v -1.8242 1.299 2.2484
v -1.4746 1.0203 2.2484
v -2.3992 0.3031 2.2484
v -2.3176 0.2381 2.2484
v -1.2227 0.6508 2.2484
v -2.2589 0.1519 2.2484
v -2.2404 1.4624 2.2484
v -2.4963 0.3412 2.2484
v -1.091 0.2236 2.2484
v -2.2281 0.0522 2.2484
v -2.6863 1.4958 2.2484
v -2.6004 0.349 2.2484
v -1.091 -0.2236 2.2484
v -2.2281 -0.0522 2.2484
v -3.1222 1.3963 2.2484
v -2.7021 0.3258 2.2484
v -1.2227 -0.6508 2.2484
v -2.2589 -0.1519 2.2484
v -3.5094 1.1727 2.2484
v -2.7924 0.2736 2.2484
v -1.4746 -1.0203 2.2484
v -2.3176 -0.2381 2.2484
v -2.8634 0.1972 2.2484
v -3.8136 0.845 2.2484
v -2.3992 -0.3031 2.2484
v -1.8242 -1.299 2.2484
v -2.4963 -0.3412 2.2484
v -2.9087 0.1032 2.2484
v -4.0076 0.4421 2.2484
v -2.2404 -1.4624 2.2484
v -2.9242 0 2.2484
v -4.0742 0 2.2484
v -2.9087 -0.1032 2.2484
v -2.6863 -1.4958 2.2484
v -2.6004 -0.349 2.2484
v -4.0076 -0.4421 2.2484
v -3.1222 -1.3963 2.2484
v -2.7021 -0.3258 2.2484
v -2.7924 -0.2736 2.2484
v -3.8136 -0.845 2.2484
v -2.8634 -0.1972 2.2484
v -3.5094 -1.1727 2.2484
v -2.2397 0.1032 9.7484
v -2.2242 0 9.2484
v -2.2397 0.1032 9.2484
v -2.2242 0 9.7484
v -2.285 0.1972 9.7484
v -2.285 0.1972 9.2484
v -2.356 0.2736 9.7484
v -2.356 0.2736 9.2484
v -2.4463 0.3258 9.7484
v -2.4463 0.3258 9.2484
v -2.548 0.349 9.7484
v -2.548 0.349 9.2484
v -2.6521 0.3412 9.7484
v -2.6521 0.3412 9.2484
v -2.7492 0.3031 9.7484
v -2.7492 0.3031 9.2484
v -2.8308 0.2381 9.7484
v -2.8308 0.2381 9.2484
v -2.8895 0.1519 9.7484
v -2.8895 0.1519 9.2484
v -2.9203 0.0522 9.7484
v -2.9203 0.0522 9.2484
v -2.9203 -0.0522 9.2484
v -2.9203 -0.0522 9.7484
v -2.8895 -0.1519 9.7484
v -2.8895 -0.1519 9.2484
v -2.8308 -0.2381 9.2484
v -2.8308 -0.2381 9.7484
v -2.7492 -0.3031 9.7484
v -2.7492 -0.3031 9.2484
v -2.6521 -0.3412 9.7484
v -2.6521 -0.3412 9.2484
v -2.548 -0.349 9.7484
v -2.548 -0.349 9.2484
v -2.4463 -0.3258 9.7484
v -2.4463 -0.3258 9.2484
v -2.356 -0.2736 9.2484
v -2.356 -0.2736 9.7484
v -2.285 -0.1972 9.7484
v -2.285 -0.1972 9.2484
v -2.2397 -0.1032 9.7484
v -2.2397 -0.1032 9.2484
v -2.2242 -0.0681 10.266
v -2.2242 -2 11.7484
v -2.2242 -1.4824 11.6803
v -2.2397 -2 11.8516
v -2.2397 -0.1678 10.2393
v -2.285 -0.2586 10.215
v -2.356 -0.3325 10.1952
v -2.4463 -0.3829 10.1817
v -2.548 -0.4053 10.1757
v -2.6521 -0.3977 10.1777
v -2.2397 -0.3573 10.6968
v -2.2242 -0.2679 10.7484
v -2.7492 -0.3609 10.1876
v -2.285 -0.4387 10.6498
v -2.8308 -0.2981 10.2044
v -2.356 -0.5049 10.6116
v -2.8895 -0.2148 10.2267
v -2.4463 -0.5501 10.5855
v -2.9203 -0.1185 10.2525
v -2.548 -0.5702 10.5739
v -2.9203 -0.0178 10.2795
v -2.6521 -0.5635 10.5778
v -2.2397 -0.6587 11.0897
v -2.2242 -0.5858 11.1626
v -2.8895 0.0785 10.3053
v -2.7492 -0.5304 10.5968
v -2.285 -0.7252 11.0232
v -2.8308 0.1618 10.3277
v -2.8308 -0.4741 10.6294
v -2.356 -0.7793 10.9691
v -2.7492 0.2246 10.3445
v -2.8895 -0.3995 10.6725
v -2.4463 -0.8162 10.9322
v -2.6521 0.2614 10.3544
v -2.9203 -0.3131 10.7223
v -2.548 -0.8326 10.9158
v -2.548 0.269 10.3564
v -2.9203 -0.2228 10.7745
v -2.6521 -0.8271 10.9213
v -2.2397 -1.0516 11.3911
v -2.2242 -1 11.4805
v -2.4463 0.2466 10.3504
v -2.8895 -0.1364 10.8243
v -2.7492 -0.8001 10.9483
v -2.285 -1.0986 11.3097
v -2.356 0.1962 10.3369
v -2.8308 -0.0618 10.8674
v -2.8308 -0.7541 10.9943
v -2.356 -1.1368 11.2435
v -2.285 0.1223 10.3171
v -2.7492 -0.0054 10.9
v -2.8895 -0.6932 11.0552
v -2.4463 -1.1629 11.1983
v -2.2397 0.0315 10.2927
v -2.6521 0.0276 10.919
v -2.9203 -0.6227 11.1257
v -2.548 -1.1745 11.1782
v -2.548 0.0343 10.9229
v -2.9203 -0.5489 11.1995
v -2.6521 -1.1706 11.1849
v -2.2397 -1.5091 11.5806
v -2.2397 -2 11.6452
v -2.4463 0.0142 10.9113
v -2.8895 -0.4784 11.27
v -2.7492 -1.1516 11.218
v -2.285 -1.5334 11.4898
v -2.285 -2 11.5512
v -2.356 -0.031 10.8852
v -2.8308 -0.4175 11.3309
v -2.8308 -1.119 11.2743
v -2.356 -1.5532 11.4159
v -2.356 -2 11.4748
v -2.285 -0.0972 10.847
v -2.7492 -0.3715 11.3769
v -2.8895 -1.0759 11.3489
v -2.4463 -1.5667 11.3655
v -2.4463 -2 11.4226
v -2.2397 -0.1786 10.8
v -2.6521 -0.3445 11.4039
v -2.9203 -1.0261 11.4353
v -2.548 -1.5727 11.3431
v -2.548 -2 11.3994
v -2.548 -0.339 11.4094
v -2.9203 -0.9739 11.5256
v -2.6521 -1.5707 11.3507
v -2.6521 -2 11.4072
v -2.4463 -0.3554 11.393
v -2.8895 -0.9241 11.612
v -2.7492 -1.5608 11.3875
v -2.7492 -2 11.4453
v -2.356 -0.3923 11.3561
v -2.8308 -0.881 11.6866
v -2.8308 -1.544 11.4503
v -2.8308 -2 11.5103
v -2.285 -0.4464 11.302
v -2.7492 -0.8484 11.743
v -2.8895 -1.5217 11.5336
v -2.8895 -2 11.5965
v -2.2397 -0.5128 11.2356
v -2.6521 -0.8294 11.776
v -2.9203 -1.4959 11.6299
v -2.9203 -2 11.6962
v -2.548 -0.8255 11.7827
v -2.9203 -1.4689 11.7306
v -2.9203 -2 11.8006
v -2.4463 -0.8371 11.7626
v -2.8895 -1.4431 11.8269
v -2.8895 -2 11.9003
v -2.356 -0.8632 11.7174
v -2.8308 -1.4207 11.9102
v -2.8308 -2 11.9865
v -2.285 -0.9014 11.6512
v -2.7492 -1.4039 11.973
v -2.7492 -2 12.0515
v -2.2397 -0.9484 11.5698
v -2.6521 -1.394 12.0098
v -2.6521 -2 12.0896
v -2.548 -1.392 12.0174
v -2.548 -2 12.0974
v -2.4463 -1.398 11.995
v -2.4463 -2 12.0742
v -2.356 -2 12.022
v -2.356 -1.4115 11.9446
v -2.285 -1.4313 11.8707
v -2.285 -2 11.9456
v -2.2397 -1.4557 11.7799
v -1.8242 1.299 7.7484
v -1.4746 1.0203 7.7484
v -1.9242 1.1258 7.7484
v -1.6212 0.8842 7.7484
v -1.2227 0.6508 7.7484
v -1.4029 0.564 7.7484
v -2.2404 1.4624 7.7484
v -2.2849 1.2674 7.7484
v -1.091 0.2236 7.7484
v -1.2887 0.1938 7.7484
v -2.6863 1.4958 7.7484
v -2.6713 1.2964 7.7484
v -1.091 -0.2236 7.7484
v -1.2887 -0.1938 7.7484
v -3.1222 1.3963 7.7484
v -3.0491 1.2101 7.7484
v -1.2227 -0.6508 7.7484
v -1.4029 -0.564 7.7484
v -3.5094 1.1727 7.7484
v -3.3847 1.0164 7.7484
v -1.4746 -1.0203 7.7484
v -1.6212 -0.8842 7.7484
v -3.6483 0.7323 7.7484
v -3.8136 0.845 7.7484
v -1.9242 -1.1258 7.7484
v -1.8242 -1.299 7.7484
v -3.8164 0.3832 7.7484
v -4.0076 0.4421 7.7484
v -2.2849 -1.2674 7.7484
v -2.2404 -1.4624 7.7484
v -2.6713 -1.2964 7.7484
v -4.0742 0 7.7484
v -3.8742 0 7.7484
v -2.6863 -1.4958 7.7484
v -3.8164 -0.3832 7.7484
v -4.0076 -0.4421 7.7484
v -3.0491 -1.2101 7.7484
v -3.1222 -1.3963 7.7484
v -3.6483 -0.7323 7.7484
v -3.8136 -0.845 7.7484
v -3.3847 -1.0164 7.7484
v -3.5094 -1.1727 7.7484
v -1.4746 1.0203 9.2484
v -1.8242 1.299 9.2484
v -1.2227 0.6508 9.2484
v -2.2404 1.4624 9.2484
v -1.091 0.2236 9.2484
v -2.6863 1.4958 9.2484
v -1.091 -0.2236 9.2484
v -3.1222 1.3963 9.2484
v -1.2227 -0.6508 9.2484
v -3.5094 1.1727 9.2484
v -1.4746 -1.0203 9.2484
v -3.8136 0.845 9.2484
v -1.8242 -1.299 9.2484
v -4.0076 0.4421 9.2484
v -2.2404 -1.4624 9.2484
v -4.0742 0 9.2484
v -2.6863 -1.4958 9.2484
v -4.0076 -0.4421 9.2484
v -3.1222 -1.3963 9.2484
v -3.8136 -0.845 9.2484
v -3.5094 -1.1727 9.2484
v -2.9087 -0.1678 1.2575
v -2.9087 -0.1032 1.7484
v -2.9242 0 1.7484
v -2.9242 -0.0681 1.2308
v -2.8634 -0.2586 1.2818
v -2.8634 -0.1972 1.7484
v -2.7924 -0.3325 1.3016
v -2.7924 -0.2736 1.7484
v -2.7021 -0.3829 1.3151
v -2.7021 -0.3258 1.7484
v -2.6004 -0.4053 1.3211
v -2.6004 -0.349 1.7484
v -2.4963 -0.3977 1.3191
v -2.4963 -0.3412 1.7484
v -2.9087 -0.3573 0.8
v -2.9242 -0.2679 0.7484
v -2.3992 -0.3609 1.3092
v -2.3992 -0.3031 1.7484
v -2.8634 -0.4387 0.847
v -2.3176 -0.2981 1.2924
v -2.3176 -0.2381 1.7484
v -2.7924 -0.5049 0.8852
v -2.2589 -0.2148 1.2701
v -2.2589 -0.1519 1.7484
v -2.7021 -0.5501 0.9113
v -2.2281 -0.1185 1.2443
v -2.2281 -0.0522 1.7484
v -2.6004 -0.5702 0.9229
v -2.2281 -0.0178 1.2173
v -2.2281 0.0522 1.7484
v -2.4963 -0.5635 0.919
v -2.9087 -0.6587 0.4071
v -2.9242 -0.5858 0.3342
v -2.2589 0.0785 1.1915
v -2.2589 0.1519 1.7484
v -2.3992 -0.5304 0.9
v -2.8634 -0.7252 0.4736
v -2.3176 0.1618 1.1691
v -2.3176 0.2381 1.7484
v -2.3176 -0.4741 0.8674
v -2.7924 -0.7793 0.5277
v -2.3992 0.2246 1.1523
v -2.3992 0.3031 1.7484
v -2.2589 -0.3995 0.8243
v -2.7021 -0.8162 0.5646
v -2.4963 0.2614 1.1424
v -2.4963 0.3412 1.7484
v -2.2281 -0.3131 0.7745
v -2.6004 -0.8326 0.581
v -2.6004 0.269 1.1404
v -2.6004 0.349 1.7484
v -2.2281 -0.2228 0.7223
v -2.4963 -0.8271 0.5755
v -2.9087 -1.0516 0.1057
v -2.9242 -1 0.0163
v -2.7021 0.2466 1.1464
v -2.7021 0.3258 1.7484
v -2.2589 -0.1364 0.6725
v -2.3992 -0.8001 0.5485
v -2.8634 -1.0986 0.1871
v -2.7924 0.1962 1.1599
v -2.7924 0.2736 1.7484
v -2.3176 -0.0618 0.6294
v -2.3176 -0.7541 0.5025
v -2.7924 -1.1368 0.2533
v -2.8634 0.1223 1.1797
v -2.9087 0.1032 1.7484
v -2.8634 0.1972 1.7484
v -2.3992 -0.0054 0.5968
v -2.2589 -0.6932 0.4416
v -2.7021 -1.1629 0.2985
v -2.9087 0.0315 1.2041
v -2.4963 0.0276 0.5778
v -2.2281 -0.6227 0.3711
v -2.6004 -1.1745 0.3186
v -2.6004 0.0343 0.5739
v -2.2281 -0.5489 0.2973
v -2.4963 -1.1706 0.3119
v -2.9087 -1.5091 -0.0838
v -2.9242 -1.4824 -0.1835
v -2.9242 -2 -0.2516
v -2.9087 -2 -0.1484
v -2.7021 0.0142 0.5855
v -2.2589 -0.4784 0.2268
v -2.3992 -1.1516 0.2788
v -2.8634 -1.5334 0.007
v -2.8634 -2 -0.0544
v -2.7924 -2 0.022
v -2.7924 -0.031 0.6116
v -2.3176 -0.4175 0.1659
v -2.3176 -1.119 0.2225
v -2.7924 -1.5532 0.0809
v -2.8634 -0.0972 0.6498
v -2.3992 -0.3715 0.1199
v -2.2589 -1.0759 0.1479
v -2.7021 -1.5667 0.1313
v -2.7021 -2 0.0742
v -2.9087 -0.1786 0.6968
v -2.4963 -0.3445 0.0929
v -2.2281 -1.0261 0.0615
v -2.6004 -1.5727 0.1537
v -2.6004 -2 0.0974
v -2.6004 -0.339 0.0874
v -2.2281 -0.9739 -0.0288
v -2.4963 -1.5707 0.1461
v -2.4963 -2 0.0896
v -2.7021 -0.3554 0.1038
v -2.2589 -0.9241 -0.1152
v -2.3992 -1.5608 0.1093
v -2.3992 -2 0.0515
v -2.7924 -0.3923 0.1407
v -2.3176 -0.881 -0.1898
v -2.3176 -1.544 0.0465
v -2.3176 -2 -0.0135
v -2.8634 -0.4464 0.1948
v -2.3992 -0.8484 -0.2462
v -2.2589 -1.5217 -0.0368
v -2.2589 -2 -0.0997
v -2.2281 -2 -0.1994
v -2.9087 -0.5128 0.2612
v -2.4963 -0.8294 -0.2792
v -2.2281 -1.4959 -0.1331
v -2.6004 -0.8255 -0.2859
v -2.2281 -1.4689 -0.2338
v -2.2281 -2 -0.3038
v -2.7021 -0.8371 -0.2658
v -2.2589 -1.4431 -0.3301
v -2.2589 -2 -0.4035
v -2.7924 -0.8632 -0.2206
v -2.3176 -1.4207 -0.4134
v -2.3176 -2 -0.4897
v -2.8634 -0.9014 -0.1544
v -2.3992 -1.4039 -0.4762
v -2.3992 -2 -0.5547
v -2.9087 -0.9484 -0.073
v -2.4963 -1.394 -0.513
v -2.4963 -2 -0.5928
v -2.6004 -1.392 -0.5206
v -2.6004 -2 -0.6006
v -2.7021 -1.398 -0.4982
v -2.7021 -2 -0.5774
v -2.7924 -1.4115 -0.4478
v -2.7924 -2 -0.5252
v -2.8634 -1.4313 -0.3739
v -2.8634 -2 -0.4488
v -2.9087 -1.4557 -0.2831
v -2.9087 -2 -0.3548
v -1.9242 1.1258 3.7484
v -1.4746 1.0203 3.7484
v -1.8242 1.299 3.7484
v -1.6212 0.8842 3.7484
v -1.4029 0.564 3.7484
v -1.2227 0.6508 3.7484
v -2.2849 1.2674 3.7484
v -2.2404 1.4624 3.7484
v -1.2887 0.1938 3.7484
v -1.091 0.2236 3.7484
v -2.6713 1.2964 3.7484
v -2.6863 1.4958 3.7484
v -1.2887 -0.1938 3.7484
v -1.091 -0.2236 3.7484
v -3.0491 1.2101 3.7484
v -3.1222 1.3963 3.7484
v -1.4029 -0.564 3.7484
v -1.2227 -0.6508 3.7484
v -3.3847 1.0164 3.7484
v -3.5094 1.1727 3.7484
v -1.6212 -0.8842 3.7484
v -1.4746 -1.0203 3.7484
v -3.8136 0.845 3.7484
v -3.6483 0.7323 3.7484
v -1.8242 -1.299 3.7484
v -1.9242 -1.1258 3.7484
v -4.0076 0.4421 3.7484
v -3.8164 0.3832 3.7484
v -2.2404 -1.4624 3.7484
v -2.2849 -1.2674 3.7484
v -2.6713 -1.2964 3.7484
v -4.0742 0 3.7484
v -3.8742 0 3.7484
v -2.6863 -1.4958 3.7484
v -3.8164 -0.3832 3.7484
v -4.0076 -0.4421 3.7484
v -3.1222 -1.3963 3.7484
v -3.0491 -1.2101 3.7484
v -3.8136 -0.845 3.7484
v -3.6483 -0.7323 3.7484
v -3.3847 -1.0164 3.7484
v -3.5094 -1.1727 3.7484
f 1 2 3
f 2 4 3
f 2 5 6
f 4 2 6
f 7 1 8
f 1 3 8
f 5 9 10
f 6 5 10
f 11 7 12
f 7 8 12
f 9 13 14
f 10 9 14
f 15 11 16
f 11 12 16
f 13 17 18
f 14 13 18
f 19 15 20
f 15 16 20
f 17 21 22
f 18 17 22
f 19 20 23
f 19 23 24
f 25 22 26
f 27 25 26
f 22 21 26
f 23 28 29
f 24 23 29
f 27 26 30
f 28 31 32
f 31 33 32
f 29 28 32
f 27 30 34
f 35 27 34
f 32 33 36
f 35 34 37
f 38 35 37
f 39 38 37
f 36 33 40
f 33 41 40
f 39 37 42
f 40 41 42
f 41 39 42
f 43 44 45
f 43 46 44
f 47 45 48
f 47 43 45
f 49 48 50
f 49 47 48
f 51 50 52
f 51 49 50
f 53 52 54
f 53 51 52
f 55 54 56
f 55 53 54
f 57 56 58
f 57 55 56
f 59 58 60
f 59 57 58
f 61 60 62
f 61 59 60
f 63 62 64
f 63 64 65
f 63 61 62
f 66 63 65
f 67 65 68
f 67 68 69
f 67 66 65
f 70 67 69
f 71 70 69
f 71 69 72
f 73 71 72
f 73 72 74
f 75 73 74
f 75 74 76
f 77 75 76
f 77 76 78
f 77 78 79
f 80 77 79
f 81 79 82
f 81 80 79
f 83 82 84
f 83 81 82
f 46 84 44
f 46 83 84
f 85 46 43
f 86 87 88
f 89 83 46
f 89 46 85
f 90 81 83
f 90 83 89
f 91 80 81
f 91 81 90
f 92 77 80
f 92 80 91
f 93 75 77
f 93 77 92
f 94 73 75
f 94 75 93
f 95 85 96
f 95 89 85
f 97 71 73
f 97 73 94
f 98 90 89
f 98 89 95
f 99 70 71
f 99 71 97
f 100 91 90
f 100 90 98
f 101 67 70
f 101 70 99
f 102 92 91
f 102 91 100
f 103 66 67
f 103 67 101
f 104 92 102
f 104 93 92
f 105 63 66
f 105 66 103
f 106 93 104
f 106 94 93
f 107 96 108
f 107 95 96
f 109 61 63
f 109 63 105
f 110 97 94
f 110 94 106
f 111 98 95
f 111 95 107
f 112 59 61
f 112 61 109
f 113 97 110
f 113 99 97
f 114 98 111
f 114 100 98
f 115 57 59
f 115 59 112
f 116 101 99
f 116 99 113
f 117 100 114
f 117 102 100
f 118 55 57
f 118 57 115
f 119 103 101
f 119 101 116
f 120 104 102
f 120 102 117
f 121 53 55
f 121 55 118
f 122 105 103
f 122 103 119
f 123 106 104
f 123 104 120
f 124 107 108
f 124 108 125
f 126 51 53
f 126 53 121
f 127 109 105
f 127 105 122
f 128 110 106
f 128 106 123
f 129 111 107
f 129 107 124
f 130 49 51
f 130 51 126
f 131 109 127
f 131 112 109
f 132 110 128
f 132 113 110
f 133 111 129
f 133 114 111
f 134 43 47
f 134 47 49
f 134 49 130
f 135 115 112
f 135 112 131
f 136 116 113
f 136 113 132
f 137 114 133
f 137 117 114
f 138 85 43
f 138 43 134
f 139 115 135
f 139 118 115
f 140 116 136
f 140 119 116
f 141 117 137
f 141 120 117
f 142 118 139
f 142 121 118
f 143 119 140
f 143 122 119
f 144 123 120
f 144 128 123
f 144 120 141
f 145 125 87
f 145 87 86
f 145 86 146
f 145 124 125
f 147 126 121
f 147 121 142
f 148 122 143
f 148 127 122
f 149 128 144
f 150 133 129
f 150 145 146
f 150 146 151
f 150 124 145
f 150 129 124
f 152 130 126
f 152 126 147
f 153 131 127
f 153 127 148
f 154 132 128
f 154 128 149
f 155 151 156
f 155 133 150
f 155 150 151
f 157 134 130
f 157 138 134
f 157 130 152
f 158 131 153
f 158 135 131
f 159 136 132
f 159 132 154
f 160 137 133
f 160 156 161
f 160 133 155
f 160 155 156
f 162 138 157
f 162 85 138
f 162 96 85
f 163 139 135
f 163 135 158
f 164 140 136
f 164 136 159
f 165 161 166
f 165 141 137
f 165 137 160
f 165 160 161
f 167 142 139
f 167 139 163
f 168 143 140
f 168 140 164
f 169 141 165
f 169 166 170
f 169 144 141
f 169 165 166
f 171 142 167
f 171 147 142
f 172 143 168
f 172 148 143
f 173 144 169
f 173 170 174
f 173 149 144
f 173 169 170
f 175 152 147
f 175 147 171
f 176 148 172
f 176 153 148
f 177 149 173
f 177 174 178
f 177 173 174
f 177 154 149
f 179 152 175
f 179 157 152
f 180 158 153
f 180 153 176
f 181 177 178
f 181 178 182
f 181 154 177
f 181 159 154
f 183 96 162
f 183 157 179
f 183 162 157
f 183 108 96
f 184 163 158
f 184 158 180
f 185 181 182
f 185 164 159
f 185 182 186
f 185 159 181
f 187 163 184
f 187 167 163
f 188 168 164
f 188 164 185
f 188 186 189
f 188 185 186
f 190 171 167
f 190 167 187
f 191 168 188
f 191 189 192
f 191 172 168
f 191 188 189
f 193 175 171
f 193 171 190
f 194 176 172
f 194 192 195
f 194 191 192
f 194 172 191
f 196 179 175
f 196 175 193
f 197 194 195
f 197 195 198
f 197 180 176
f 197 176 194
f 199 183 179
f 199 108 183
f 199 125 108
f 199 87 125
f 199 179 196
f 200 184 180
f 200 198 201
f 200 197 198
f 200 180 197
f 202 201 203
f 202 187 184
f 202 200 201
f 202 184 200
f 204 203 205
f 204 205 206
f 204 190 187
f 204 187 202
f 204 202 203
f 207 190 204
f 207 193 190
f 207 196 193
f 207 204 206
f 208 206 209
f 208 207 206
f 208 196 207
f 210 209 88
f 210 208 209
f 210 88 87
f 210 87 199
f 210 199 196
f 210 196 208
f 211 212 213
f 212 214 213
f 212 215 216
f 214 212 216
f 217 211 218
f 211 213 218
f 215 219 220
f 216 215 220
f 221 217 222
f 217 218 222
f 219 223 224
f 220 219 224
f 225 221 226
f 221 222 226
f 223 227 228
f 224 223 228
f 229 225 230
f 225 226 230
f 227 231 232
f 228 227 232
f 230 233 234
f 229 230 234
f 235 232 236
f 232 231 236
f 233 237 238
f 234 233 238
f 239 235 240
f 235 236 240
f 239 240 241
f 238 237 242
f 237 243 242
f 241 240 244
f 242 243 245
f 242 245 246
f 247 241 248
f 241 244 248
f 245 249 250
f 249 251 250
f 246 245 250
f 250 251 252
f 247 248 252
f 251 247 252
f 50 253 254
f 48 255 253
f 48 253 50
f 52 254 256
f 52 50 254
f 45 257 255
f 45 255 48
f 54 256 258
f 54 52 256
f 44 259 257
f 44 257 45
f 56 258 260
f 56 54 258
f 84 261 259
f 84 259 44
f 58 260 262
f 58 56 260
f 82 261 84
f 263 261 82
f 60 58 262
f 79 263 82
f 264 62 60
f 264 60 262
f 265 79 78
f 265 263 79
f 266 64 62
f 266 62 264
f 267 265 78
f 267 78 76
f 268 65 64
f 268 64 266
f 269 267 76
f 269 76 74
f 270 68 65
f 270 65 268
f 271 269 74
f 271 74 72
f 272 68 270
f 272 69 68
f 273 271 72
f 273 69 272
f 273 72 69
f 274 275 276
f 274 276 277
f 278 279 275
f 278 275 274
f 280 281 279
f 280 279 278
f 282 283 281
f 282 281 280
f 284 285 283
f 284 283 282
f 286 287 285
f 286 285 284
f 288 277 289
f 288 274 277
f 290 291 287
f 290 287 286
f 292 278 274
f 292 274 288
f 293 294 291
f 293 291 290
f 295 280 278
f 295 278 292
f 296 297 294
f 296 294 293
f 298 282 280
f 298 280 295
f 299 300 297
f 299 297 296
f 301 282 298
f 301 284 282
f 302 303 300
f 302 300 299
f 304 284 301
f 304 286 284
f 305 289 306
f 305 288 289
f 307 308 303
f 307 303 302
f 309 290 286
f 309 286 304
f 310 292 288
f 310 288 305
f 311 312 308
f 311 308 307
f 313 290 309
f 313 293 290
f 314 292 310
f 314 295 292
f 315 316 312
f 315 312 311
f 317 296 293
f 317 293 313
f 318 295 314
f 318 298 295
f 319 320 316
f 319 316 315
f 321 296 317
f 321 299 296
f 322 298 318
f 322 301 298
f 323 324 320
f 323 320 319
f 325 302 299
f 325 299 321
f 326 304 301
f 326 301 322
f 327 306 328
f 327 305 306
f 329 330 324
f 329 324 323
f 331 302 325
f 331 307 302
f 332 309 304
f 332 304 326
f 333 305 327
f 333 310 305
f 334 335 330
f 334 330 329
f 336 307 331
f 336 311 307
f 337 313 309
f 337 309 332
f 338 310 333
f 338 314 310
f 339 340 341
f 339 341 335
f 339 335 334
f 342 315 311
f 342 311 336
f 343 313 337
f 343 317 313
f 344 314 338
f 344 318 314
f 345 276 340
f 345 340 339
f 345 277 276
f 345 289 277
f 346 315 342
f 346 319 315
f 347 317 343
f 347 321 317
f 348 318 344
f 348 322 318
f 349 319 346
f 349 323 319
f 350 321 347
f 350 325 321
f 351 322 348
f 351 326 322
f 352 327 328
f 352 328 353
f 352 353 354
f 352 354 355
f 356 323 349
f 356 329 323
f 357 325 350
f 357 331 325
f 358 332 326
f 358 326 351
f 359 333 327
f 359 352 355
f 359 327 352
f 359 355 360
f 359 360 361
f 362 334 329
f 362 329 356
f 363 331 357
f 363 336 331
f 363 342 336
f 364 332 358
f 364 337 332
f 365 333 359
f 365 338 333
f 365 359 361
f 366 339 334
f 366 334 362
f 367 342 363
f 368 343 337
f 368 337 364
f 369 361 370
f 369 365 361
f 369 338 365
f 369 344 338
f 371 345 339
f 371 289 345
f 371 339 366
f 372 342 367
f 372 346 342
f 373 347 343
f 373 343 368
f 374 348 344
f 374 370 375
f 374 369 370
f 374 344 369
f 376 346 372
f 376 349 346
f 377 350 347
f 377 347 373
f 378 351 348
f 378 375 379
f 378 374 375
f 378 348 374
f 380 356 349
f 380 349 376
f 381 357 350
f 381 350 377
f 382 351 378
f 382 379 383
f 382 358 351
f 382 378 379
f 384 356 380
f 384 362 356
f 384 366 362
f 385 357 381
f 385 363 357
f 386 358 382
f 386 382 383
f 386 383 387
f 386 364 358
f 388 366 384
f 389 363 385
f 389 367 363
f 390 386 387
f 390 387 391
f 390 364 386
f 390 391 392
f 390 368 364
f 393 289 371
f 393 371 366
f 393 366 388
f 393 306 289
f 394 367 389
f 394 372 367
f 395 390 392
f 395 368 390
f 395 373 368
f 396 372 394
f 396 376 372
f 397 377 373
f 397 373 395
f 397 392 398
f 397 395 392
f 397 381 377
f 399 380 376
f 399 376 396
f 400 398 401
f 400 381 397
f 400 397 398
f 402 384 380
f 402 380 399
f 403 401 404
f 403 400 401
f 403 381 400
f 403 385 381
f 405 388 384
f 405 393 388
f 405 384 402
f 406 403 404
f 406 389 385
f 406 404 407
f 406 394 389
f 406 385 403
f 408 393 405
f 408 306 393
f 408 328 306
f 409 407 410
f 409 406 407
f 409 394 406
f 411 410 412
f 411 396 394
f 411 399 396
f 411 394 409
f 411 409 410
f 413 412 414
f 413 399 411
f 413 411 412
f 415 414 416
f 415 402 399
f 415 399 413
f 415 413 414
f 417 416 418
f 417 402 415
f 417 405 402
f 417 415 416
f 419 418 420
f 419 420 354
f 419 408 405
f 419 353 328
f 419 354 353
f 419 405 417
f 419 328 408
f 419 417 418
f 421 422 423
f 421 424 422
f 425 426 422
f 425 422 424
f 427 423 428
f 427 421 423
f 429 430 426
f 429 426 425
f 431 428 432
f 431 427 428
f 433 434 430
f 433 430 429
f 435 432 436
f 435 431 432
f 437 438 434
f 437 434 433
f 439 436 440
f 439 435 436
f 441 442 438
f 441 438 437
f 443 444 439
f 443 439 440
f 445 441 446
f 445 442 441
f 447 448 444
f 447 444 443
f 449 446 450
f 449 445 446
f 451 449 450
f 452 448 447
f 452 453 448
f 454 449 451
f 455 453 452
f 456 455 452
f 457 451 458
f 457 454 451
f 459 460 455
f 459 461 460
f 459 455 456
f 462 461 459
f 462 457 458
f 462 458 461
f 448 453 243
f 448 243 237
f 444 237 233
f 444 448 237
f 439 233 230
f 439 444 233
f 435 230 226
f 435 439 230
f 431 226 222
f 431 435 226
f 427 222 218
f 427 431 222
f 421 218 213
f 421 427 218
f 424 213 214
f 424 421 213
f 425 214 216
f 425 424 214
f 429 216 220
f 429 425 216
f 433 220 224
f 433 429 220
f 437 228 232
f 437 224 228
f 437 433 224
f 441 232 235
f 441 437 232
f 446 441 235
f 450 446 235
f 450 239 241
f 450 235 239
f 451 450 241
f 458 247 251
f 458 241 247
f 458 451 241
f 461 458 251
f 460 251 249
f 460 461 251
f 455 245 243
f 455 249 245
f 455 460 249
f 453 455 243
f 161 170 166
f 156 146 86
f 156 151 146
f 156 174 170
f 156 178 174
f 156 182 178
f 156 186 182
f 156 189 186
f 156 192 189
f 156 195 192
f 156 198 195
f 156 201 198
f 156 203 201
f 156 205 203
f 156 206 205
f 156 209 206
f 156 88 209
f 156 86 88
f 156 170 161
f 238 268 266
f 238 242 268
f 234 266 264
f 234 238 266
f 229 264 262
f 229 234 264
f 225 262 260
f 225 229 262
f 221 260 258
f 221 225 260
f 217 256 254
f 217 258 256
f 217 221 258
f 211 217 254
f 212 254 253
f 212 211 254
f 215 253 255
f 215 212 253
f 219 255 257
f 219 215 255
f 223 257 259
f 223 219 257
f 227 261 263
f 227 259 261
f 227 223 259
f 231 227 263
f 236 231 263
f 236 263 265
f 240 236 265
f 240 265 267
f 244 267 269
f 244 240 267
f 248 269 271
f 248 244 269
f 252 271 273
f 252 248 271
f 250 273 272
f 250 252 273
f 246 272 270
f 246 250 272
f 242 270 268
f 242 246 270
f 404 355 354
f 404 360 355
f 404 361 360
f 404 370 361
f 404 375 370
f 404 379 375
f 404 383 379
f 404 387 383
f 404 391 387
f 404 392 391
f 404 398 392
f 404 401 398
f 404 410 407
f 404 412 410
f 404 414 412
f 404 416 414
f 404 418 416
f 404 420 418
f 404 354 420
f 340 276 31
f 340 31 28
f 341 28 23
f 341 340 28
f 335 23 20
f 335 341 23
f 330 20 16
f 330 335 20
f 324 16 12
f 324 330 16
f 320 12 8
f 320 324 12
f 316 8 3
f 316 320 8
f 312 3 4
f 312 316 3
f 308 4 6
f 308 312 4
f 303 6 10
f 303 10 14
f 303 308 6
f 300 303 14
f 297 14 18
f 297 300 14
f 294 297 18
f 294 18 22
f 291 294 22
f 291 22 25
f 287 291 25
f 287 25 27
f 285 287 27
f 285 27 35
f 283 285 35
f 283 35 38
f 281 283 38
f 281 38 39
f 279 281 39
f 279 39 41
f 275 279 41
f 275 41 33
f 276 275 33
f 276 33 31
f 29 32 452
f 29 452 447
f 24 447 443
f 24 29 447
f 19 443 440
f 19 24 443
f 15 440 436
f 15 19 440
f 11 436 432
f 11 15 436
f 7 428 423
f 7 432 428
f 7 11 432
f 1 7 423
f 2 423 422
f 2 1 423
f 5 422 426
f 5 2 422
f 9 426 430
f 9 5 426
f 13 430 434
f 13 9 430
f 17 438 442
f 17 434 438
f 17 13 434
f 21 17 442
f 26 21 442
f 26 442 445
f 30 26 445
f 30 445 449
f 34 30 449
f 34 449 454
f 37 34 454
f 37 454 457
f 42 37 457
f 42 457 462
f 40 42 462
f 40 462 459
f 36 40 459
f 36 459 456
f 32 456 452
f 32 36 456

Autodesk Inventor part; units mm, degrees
ref_plane "YZ Plane" through (0, 0, 0) normal (1, 0, 0) x (0, 1, 0)
ref_plane "XZ Plane" through (0, 0, 0) normal (0, 1, 0) x (-1, 0, 0)
ref_plane "XY Plane" through (0, 0, 0) normal (0, 0, 1) x (1, 0, 0)
sketch "Эскиз1" plane through (0, 0, 0) normal (0, 1, 0) x (-1, 0, 0)
  line L0 (4.0742, 9.2484) -> (4.0742, 7.7484)
  line L1 (4.0742, 7.7484) -> (3.8742, 7.7484)
  line L2 (3.8742, 7.7484) -> (3.8742, 3.7484)
  line L3 (3.8742, 3.7484) -> (4.0742, 3.7484)
  line L4 (4.0742, 3.7484) -> (4.0742, 2.2484)
  line L5 (4.0742, 2.2484) -> (2.5742, 2.2484)
  line L6 (2.5742, 2.2484) -> (2.5742, 9.2484)
  line L7 (2.5742, 9.2484) -> (4.0742, 9.2484)
  point P0 (0, 0)
  dimension "d0" = 1.5
  dimension "d1" = 0.2
  dimension "d2" = 4
  dimension "d3" = 0.2
  dimension "d4" = 1.5
  dimension "d5" = 1.5
  dimension "d6" = 7
revolve "Вращение1" add sketch "Эскиз1" angle 360 about axis through (-2.5742, 0, 2.2484) along (0, 0, 1)
sketch "Эскиз2" plane through (-2.5742, 0, 9.2484) normal (0, 0, 1) x (1, 0, 0)
  circle A0 centre (0, 0) radius 1.3 projected
  circle A1 centre (0, 0) radius 0.35
  circle A2 centre (-6.8053, 0) radius 0.3139
  point P0 (2.5742, 0)
  dimension "d8" = 0.7
sketch "Эскиз3" plane through (-2.5742, 0, 2.2484) normal (0, 0, -1) x (-1, 0, 0)
  circle A0 centre (0, 0) radius 0.35
  point P0 (-2.5742, 0)
  dimension "d9" = 0.7
sketch3d "3D эскиз1"
  line L0 (-2.5742, 0, 2.2484) -> (-2.5742, 0, 1.7484)
  arc A0 (-2.5742, 0, 1.7484) -> (-2.5742, -2, -0.2516) centre (-2.5742, -2, 1.7484) ccw
  dimension "d10" = 2.5
  dimension "d11" = 2
  dimension "d16" = 2
sweep "Сдвиг2" add profiles "Эскиз3" path "3D эскиз1"
sketch3d "3D эскиз2"
  line L0 (-2.5742, 0, 9.2484) -> (-2.5742, 0, 9.7484)
  arc A0 (-2.5742, 0, 9.7484) -> (-2.5742, -2, 11.7484) centre (-2.5742, -2, 9.7484) ccw
  dimension "d12" = 2.5
  dimension "d13" = 2
  dimension "d19" = 2
sweep "Сдвиг3" add profiles "Эскиз2" path "3D эскиз2" contours A1
equation "\"D22\" = d10 + d6 + d12"
